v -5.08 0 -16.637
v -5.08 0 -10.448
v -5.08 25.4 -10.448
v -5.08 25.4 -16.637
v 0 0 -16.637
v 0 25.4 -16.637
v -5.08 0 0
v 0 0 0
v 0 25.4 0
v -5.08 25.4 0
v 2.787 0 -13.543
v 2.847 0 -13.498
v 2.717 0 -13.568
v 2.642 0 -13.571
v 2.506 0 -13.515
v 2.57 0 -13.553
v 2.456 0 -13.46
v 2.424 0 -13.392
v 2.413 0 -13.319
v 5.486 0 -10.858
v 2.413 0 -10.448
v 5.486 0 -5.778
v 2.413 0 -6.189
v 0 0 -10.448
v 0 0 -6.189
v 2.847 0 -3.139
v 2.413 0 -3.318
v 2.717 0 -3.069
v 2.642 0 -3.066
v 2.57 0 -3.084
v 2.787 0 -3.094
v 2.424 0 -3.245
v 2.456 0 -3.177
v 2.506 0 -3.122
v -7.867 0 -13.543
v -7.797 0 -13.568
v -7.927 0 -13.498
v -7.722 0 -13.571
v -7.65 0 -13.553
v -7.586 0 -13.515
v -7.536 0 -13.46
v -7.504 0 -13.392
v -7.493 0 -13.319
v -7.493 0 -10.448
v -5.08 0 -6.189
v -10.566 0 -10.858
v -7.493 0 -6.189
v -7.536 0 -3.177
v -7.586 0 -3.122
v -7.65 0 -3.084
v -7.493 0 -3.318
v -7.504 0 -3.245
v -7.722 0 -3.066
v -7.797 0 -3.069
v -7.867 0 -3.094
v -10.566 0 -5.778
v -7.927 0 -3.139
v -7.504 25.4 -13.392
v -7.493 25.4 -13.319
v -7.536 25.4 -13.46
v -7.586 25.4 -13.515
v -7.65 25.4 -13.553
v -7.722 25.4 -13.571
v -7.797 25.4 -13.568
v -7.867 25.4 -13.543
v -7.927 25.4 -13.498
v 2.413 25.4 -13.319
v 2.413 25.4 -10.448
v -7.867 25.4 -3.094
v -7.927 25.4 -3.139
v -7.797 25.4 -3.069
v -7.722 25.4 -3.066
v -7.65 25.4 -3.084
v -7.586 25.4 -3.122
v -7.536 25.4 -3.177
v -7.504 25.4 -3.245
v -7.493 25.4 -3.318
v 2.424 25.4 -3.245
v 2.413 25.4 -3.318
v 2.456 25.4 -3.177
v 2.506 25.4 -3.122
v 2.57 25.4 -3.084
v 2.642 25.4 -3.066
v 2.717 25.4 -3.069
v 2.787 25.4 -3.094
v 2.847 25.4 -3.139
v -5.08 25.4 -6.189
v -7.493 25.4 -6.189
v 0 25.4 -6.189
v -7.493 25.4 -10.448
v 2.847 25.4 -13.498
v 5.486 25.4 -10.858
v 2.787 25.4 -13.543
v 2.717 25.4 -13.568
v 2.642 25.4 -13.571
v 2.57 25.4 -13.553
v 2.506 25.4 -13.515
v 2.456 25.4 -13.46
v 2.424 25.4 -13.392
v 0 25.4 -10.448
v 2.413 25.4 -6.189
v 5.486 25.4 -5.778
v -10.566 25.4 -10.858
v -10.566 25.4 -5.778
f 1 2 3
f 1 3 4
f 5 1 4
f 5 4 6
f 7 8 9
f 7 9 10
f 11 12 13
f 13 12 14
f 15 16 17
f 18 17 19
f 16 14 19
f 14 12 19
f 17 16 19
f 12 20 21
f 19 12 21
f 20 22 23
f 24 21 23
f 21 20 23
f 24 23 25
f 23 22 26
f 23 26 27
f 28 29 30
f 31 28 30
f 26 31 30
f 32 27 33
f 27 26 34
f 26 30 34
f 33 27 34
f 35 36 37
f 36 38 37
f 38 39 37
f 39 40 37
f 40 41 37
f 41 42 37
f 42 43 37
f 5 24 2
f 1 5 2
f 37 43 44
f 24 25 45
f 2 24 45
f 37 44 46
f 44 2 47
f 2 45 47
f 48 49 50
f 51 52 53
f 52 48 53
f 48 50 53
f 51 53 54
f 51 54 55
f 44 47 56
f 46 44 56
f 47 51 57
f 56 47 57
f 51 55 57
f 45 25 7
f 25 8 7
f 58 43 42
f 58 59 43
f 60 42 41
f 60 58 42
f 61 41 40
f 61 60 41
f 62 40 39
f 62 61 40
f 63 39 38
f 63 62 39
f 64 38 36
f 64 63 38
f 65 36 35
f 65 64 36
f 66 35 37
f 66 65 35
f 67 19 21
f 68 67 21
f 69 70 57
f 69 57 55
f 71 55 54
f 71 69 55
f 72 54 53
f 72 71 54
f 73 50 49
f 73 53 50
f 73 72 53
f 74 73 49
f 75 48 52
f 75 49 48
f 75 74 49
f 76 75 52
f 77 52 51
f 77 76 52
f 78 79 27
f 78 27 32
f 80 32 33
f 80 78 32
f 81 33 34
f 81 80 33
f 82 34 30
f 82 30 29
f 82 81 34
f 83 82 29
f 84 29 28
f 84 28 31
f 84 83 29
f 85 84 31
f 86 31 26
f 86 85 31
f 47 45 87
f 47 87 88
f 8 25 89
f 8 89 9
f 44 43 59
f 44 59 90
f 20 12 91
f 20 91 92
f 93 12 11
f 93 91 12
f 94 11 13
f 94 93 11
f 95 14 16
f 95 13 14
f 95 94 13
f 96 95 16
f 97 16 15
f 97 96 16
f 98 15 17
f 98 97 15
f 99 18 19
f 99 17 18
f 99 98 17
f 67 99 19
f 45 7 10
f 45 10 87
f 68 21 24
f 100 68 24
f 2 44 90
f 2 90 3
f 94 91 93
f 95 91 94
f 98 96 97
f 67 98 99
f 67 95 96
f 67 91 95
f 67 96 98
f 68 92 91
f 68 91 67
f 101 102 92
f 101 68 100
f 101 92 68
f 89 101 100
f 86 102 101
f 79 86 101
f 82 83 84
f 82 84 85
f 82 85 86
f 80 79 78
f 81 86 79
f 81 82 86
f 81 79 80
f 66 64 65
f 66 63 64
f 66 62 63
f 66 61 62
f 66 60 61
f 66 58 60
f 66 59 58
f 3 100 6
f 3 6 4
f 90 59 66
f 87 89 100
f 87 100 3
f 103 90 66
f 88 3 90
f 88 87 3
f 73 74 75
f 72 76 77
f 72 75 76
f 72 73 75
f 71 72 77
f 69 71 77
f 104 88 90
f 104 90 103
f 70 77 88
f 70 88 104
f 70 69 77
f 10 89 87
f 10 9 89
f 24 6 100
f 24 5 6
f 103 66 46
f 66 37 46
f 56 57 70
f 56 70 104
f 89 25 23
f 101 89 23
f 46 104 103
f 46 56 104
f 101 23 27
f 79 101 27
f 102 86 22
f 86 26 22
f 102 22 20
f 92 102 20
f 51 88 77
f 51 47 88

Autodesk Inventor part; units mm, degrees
ref_plane "YZ Plane" through (0, 0, 0) normal (1, 0, 0) x (0, 1, 0)
ref_plane "XZ Plane" through (0, 0, 0) normal (0, 1, 0) x (-1, 0, 0)
ref_plane "XY Plane" through (0, 0, 0) normal (0, 0, 1) x (1, 0, 0)
sketch "Sketch1" plane through (0, 0, 0) normal (0, 1, 0) x (-1, 0, 0)
  line L0 (0, 0) -> (5.08, 0)
  line L1 (5.08, 0) -> (5.08, -16.637)
  line L2 (5.08, -16.637) -> (0, -16.637)
  line L3 (0, -16.637) -> (0, 0)
  line L4 (0, -6.1892) -> (7.493, -6.1892)
  line L5 (7.493, -6.1892) -> (7.493, -10.4478)
  line L6 (7.493, -10.4478) -> (0, -10.4478)
  line L7 (10.5664, -5.7785) -> (10.5664, -10.8585)
  line L8 (7.493, -13.9319) -> (7.493, -2.7051)
  line L9 (7.493, -13.9319) -> (10.5664, -10.8585)
  line L10 (7.493, -2.7051) -> (10.5664, -5.7785)
  line L11 (0, -6.1892) -> (-2.413, -6.1892)
  line L12 (-2.413, -10.4478) -> (0, -10.4478)
  line L13 (-5.4864, -5.7785) -> (-5.4864, -10.8585)
  line L14 (-2.413, -13.9319) -> (-2.413, -2.7051)
  line L15 (-2.413, -13.9319) -> (-5.4864, -10.8585)
  line L16 (-2.413, -2.7051) -> (-5.4864, -5.7785)
  point P0 (-4.9276, -6.1892)
  dimension "d0" = 5.08
  dimension "d1" = 16.637
  dimension "d2" = 2.413
  dimension "d9" = 3.0734
  dimension "d12" = 0
  dimension "d16" = 11.2268
  dimension "d20" = 135
  dimension "d21" = 135
  dimension "d24" = 6.1893
  dimension "d25" = 16.637
  dimension "d26" = 3.4842
  dimension "d33" = 3.4842
  dimension "d34" = 3.0734
  dimension "d35" = 2.413
  dimension "d36" = 6.1893
  dimension "d37" = 5.08
  dimension "d38" = 5.08
  dimension "d39" = 135
  dimension "d40" = 135
extrude "Extrusion2" add sketch "Sketch1" along normal blind 25.4
fillet "Fillet1" radius 0.254 4 edges at (2.413, 12.7, -13.9319) (-7.493, 12.7, -13.9319) (2.413, 12.7, -2.7051) (-7.493, 12.7, -2.7051)
equation "\"d16\" = d15"
equation "\"d21\" = d20"
equation "\"d24\" = -0.5 * d4 + 0.5 * d25"
equation "\"d15\" = 11.2268"
equation "\"d4\" = 4.2585"
properties part number "20X20 lift conecter" material "PC/ABS Plastic"
